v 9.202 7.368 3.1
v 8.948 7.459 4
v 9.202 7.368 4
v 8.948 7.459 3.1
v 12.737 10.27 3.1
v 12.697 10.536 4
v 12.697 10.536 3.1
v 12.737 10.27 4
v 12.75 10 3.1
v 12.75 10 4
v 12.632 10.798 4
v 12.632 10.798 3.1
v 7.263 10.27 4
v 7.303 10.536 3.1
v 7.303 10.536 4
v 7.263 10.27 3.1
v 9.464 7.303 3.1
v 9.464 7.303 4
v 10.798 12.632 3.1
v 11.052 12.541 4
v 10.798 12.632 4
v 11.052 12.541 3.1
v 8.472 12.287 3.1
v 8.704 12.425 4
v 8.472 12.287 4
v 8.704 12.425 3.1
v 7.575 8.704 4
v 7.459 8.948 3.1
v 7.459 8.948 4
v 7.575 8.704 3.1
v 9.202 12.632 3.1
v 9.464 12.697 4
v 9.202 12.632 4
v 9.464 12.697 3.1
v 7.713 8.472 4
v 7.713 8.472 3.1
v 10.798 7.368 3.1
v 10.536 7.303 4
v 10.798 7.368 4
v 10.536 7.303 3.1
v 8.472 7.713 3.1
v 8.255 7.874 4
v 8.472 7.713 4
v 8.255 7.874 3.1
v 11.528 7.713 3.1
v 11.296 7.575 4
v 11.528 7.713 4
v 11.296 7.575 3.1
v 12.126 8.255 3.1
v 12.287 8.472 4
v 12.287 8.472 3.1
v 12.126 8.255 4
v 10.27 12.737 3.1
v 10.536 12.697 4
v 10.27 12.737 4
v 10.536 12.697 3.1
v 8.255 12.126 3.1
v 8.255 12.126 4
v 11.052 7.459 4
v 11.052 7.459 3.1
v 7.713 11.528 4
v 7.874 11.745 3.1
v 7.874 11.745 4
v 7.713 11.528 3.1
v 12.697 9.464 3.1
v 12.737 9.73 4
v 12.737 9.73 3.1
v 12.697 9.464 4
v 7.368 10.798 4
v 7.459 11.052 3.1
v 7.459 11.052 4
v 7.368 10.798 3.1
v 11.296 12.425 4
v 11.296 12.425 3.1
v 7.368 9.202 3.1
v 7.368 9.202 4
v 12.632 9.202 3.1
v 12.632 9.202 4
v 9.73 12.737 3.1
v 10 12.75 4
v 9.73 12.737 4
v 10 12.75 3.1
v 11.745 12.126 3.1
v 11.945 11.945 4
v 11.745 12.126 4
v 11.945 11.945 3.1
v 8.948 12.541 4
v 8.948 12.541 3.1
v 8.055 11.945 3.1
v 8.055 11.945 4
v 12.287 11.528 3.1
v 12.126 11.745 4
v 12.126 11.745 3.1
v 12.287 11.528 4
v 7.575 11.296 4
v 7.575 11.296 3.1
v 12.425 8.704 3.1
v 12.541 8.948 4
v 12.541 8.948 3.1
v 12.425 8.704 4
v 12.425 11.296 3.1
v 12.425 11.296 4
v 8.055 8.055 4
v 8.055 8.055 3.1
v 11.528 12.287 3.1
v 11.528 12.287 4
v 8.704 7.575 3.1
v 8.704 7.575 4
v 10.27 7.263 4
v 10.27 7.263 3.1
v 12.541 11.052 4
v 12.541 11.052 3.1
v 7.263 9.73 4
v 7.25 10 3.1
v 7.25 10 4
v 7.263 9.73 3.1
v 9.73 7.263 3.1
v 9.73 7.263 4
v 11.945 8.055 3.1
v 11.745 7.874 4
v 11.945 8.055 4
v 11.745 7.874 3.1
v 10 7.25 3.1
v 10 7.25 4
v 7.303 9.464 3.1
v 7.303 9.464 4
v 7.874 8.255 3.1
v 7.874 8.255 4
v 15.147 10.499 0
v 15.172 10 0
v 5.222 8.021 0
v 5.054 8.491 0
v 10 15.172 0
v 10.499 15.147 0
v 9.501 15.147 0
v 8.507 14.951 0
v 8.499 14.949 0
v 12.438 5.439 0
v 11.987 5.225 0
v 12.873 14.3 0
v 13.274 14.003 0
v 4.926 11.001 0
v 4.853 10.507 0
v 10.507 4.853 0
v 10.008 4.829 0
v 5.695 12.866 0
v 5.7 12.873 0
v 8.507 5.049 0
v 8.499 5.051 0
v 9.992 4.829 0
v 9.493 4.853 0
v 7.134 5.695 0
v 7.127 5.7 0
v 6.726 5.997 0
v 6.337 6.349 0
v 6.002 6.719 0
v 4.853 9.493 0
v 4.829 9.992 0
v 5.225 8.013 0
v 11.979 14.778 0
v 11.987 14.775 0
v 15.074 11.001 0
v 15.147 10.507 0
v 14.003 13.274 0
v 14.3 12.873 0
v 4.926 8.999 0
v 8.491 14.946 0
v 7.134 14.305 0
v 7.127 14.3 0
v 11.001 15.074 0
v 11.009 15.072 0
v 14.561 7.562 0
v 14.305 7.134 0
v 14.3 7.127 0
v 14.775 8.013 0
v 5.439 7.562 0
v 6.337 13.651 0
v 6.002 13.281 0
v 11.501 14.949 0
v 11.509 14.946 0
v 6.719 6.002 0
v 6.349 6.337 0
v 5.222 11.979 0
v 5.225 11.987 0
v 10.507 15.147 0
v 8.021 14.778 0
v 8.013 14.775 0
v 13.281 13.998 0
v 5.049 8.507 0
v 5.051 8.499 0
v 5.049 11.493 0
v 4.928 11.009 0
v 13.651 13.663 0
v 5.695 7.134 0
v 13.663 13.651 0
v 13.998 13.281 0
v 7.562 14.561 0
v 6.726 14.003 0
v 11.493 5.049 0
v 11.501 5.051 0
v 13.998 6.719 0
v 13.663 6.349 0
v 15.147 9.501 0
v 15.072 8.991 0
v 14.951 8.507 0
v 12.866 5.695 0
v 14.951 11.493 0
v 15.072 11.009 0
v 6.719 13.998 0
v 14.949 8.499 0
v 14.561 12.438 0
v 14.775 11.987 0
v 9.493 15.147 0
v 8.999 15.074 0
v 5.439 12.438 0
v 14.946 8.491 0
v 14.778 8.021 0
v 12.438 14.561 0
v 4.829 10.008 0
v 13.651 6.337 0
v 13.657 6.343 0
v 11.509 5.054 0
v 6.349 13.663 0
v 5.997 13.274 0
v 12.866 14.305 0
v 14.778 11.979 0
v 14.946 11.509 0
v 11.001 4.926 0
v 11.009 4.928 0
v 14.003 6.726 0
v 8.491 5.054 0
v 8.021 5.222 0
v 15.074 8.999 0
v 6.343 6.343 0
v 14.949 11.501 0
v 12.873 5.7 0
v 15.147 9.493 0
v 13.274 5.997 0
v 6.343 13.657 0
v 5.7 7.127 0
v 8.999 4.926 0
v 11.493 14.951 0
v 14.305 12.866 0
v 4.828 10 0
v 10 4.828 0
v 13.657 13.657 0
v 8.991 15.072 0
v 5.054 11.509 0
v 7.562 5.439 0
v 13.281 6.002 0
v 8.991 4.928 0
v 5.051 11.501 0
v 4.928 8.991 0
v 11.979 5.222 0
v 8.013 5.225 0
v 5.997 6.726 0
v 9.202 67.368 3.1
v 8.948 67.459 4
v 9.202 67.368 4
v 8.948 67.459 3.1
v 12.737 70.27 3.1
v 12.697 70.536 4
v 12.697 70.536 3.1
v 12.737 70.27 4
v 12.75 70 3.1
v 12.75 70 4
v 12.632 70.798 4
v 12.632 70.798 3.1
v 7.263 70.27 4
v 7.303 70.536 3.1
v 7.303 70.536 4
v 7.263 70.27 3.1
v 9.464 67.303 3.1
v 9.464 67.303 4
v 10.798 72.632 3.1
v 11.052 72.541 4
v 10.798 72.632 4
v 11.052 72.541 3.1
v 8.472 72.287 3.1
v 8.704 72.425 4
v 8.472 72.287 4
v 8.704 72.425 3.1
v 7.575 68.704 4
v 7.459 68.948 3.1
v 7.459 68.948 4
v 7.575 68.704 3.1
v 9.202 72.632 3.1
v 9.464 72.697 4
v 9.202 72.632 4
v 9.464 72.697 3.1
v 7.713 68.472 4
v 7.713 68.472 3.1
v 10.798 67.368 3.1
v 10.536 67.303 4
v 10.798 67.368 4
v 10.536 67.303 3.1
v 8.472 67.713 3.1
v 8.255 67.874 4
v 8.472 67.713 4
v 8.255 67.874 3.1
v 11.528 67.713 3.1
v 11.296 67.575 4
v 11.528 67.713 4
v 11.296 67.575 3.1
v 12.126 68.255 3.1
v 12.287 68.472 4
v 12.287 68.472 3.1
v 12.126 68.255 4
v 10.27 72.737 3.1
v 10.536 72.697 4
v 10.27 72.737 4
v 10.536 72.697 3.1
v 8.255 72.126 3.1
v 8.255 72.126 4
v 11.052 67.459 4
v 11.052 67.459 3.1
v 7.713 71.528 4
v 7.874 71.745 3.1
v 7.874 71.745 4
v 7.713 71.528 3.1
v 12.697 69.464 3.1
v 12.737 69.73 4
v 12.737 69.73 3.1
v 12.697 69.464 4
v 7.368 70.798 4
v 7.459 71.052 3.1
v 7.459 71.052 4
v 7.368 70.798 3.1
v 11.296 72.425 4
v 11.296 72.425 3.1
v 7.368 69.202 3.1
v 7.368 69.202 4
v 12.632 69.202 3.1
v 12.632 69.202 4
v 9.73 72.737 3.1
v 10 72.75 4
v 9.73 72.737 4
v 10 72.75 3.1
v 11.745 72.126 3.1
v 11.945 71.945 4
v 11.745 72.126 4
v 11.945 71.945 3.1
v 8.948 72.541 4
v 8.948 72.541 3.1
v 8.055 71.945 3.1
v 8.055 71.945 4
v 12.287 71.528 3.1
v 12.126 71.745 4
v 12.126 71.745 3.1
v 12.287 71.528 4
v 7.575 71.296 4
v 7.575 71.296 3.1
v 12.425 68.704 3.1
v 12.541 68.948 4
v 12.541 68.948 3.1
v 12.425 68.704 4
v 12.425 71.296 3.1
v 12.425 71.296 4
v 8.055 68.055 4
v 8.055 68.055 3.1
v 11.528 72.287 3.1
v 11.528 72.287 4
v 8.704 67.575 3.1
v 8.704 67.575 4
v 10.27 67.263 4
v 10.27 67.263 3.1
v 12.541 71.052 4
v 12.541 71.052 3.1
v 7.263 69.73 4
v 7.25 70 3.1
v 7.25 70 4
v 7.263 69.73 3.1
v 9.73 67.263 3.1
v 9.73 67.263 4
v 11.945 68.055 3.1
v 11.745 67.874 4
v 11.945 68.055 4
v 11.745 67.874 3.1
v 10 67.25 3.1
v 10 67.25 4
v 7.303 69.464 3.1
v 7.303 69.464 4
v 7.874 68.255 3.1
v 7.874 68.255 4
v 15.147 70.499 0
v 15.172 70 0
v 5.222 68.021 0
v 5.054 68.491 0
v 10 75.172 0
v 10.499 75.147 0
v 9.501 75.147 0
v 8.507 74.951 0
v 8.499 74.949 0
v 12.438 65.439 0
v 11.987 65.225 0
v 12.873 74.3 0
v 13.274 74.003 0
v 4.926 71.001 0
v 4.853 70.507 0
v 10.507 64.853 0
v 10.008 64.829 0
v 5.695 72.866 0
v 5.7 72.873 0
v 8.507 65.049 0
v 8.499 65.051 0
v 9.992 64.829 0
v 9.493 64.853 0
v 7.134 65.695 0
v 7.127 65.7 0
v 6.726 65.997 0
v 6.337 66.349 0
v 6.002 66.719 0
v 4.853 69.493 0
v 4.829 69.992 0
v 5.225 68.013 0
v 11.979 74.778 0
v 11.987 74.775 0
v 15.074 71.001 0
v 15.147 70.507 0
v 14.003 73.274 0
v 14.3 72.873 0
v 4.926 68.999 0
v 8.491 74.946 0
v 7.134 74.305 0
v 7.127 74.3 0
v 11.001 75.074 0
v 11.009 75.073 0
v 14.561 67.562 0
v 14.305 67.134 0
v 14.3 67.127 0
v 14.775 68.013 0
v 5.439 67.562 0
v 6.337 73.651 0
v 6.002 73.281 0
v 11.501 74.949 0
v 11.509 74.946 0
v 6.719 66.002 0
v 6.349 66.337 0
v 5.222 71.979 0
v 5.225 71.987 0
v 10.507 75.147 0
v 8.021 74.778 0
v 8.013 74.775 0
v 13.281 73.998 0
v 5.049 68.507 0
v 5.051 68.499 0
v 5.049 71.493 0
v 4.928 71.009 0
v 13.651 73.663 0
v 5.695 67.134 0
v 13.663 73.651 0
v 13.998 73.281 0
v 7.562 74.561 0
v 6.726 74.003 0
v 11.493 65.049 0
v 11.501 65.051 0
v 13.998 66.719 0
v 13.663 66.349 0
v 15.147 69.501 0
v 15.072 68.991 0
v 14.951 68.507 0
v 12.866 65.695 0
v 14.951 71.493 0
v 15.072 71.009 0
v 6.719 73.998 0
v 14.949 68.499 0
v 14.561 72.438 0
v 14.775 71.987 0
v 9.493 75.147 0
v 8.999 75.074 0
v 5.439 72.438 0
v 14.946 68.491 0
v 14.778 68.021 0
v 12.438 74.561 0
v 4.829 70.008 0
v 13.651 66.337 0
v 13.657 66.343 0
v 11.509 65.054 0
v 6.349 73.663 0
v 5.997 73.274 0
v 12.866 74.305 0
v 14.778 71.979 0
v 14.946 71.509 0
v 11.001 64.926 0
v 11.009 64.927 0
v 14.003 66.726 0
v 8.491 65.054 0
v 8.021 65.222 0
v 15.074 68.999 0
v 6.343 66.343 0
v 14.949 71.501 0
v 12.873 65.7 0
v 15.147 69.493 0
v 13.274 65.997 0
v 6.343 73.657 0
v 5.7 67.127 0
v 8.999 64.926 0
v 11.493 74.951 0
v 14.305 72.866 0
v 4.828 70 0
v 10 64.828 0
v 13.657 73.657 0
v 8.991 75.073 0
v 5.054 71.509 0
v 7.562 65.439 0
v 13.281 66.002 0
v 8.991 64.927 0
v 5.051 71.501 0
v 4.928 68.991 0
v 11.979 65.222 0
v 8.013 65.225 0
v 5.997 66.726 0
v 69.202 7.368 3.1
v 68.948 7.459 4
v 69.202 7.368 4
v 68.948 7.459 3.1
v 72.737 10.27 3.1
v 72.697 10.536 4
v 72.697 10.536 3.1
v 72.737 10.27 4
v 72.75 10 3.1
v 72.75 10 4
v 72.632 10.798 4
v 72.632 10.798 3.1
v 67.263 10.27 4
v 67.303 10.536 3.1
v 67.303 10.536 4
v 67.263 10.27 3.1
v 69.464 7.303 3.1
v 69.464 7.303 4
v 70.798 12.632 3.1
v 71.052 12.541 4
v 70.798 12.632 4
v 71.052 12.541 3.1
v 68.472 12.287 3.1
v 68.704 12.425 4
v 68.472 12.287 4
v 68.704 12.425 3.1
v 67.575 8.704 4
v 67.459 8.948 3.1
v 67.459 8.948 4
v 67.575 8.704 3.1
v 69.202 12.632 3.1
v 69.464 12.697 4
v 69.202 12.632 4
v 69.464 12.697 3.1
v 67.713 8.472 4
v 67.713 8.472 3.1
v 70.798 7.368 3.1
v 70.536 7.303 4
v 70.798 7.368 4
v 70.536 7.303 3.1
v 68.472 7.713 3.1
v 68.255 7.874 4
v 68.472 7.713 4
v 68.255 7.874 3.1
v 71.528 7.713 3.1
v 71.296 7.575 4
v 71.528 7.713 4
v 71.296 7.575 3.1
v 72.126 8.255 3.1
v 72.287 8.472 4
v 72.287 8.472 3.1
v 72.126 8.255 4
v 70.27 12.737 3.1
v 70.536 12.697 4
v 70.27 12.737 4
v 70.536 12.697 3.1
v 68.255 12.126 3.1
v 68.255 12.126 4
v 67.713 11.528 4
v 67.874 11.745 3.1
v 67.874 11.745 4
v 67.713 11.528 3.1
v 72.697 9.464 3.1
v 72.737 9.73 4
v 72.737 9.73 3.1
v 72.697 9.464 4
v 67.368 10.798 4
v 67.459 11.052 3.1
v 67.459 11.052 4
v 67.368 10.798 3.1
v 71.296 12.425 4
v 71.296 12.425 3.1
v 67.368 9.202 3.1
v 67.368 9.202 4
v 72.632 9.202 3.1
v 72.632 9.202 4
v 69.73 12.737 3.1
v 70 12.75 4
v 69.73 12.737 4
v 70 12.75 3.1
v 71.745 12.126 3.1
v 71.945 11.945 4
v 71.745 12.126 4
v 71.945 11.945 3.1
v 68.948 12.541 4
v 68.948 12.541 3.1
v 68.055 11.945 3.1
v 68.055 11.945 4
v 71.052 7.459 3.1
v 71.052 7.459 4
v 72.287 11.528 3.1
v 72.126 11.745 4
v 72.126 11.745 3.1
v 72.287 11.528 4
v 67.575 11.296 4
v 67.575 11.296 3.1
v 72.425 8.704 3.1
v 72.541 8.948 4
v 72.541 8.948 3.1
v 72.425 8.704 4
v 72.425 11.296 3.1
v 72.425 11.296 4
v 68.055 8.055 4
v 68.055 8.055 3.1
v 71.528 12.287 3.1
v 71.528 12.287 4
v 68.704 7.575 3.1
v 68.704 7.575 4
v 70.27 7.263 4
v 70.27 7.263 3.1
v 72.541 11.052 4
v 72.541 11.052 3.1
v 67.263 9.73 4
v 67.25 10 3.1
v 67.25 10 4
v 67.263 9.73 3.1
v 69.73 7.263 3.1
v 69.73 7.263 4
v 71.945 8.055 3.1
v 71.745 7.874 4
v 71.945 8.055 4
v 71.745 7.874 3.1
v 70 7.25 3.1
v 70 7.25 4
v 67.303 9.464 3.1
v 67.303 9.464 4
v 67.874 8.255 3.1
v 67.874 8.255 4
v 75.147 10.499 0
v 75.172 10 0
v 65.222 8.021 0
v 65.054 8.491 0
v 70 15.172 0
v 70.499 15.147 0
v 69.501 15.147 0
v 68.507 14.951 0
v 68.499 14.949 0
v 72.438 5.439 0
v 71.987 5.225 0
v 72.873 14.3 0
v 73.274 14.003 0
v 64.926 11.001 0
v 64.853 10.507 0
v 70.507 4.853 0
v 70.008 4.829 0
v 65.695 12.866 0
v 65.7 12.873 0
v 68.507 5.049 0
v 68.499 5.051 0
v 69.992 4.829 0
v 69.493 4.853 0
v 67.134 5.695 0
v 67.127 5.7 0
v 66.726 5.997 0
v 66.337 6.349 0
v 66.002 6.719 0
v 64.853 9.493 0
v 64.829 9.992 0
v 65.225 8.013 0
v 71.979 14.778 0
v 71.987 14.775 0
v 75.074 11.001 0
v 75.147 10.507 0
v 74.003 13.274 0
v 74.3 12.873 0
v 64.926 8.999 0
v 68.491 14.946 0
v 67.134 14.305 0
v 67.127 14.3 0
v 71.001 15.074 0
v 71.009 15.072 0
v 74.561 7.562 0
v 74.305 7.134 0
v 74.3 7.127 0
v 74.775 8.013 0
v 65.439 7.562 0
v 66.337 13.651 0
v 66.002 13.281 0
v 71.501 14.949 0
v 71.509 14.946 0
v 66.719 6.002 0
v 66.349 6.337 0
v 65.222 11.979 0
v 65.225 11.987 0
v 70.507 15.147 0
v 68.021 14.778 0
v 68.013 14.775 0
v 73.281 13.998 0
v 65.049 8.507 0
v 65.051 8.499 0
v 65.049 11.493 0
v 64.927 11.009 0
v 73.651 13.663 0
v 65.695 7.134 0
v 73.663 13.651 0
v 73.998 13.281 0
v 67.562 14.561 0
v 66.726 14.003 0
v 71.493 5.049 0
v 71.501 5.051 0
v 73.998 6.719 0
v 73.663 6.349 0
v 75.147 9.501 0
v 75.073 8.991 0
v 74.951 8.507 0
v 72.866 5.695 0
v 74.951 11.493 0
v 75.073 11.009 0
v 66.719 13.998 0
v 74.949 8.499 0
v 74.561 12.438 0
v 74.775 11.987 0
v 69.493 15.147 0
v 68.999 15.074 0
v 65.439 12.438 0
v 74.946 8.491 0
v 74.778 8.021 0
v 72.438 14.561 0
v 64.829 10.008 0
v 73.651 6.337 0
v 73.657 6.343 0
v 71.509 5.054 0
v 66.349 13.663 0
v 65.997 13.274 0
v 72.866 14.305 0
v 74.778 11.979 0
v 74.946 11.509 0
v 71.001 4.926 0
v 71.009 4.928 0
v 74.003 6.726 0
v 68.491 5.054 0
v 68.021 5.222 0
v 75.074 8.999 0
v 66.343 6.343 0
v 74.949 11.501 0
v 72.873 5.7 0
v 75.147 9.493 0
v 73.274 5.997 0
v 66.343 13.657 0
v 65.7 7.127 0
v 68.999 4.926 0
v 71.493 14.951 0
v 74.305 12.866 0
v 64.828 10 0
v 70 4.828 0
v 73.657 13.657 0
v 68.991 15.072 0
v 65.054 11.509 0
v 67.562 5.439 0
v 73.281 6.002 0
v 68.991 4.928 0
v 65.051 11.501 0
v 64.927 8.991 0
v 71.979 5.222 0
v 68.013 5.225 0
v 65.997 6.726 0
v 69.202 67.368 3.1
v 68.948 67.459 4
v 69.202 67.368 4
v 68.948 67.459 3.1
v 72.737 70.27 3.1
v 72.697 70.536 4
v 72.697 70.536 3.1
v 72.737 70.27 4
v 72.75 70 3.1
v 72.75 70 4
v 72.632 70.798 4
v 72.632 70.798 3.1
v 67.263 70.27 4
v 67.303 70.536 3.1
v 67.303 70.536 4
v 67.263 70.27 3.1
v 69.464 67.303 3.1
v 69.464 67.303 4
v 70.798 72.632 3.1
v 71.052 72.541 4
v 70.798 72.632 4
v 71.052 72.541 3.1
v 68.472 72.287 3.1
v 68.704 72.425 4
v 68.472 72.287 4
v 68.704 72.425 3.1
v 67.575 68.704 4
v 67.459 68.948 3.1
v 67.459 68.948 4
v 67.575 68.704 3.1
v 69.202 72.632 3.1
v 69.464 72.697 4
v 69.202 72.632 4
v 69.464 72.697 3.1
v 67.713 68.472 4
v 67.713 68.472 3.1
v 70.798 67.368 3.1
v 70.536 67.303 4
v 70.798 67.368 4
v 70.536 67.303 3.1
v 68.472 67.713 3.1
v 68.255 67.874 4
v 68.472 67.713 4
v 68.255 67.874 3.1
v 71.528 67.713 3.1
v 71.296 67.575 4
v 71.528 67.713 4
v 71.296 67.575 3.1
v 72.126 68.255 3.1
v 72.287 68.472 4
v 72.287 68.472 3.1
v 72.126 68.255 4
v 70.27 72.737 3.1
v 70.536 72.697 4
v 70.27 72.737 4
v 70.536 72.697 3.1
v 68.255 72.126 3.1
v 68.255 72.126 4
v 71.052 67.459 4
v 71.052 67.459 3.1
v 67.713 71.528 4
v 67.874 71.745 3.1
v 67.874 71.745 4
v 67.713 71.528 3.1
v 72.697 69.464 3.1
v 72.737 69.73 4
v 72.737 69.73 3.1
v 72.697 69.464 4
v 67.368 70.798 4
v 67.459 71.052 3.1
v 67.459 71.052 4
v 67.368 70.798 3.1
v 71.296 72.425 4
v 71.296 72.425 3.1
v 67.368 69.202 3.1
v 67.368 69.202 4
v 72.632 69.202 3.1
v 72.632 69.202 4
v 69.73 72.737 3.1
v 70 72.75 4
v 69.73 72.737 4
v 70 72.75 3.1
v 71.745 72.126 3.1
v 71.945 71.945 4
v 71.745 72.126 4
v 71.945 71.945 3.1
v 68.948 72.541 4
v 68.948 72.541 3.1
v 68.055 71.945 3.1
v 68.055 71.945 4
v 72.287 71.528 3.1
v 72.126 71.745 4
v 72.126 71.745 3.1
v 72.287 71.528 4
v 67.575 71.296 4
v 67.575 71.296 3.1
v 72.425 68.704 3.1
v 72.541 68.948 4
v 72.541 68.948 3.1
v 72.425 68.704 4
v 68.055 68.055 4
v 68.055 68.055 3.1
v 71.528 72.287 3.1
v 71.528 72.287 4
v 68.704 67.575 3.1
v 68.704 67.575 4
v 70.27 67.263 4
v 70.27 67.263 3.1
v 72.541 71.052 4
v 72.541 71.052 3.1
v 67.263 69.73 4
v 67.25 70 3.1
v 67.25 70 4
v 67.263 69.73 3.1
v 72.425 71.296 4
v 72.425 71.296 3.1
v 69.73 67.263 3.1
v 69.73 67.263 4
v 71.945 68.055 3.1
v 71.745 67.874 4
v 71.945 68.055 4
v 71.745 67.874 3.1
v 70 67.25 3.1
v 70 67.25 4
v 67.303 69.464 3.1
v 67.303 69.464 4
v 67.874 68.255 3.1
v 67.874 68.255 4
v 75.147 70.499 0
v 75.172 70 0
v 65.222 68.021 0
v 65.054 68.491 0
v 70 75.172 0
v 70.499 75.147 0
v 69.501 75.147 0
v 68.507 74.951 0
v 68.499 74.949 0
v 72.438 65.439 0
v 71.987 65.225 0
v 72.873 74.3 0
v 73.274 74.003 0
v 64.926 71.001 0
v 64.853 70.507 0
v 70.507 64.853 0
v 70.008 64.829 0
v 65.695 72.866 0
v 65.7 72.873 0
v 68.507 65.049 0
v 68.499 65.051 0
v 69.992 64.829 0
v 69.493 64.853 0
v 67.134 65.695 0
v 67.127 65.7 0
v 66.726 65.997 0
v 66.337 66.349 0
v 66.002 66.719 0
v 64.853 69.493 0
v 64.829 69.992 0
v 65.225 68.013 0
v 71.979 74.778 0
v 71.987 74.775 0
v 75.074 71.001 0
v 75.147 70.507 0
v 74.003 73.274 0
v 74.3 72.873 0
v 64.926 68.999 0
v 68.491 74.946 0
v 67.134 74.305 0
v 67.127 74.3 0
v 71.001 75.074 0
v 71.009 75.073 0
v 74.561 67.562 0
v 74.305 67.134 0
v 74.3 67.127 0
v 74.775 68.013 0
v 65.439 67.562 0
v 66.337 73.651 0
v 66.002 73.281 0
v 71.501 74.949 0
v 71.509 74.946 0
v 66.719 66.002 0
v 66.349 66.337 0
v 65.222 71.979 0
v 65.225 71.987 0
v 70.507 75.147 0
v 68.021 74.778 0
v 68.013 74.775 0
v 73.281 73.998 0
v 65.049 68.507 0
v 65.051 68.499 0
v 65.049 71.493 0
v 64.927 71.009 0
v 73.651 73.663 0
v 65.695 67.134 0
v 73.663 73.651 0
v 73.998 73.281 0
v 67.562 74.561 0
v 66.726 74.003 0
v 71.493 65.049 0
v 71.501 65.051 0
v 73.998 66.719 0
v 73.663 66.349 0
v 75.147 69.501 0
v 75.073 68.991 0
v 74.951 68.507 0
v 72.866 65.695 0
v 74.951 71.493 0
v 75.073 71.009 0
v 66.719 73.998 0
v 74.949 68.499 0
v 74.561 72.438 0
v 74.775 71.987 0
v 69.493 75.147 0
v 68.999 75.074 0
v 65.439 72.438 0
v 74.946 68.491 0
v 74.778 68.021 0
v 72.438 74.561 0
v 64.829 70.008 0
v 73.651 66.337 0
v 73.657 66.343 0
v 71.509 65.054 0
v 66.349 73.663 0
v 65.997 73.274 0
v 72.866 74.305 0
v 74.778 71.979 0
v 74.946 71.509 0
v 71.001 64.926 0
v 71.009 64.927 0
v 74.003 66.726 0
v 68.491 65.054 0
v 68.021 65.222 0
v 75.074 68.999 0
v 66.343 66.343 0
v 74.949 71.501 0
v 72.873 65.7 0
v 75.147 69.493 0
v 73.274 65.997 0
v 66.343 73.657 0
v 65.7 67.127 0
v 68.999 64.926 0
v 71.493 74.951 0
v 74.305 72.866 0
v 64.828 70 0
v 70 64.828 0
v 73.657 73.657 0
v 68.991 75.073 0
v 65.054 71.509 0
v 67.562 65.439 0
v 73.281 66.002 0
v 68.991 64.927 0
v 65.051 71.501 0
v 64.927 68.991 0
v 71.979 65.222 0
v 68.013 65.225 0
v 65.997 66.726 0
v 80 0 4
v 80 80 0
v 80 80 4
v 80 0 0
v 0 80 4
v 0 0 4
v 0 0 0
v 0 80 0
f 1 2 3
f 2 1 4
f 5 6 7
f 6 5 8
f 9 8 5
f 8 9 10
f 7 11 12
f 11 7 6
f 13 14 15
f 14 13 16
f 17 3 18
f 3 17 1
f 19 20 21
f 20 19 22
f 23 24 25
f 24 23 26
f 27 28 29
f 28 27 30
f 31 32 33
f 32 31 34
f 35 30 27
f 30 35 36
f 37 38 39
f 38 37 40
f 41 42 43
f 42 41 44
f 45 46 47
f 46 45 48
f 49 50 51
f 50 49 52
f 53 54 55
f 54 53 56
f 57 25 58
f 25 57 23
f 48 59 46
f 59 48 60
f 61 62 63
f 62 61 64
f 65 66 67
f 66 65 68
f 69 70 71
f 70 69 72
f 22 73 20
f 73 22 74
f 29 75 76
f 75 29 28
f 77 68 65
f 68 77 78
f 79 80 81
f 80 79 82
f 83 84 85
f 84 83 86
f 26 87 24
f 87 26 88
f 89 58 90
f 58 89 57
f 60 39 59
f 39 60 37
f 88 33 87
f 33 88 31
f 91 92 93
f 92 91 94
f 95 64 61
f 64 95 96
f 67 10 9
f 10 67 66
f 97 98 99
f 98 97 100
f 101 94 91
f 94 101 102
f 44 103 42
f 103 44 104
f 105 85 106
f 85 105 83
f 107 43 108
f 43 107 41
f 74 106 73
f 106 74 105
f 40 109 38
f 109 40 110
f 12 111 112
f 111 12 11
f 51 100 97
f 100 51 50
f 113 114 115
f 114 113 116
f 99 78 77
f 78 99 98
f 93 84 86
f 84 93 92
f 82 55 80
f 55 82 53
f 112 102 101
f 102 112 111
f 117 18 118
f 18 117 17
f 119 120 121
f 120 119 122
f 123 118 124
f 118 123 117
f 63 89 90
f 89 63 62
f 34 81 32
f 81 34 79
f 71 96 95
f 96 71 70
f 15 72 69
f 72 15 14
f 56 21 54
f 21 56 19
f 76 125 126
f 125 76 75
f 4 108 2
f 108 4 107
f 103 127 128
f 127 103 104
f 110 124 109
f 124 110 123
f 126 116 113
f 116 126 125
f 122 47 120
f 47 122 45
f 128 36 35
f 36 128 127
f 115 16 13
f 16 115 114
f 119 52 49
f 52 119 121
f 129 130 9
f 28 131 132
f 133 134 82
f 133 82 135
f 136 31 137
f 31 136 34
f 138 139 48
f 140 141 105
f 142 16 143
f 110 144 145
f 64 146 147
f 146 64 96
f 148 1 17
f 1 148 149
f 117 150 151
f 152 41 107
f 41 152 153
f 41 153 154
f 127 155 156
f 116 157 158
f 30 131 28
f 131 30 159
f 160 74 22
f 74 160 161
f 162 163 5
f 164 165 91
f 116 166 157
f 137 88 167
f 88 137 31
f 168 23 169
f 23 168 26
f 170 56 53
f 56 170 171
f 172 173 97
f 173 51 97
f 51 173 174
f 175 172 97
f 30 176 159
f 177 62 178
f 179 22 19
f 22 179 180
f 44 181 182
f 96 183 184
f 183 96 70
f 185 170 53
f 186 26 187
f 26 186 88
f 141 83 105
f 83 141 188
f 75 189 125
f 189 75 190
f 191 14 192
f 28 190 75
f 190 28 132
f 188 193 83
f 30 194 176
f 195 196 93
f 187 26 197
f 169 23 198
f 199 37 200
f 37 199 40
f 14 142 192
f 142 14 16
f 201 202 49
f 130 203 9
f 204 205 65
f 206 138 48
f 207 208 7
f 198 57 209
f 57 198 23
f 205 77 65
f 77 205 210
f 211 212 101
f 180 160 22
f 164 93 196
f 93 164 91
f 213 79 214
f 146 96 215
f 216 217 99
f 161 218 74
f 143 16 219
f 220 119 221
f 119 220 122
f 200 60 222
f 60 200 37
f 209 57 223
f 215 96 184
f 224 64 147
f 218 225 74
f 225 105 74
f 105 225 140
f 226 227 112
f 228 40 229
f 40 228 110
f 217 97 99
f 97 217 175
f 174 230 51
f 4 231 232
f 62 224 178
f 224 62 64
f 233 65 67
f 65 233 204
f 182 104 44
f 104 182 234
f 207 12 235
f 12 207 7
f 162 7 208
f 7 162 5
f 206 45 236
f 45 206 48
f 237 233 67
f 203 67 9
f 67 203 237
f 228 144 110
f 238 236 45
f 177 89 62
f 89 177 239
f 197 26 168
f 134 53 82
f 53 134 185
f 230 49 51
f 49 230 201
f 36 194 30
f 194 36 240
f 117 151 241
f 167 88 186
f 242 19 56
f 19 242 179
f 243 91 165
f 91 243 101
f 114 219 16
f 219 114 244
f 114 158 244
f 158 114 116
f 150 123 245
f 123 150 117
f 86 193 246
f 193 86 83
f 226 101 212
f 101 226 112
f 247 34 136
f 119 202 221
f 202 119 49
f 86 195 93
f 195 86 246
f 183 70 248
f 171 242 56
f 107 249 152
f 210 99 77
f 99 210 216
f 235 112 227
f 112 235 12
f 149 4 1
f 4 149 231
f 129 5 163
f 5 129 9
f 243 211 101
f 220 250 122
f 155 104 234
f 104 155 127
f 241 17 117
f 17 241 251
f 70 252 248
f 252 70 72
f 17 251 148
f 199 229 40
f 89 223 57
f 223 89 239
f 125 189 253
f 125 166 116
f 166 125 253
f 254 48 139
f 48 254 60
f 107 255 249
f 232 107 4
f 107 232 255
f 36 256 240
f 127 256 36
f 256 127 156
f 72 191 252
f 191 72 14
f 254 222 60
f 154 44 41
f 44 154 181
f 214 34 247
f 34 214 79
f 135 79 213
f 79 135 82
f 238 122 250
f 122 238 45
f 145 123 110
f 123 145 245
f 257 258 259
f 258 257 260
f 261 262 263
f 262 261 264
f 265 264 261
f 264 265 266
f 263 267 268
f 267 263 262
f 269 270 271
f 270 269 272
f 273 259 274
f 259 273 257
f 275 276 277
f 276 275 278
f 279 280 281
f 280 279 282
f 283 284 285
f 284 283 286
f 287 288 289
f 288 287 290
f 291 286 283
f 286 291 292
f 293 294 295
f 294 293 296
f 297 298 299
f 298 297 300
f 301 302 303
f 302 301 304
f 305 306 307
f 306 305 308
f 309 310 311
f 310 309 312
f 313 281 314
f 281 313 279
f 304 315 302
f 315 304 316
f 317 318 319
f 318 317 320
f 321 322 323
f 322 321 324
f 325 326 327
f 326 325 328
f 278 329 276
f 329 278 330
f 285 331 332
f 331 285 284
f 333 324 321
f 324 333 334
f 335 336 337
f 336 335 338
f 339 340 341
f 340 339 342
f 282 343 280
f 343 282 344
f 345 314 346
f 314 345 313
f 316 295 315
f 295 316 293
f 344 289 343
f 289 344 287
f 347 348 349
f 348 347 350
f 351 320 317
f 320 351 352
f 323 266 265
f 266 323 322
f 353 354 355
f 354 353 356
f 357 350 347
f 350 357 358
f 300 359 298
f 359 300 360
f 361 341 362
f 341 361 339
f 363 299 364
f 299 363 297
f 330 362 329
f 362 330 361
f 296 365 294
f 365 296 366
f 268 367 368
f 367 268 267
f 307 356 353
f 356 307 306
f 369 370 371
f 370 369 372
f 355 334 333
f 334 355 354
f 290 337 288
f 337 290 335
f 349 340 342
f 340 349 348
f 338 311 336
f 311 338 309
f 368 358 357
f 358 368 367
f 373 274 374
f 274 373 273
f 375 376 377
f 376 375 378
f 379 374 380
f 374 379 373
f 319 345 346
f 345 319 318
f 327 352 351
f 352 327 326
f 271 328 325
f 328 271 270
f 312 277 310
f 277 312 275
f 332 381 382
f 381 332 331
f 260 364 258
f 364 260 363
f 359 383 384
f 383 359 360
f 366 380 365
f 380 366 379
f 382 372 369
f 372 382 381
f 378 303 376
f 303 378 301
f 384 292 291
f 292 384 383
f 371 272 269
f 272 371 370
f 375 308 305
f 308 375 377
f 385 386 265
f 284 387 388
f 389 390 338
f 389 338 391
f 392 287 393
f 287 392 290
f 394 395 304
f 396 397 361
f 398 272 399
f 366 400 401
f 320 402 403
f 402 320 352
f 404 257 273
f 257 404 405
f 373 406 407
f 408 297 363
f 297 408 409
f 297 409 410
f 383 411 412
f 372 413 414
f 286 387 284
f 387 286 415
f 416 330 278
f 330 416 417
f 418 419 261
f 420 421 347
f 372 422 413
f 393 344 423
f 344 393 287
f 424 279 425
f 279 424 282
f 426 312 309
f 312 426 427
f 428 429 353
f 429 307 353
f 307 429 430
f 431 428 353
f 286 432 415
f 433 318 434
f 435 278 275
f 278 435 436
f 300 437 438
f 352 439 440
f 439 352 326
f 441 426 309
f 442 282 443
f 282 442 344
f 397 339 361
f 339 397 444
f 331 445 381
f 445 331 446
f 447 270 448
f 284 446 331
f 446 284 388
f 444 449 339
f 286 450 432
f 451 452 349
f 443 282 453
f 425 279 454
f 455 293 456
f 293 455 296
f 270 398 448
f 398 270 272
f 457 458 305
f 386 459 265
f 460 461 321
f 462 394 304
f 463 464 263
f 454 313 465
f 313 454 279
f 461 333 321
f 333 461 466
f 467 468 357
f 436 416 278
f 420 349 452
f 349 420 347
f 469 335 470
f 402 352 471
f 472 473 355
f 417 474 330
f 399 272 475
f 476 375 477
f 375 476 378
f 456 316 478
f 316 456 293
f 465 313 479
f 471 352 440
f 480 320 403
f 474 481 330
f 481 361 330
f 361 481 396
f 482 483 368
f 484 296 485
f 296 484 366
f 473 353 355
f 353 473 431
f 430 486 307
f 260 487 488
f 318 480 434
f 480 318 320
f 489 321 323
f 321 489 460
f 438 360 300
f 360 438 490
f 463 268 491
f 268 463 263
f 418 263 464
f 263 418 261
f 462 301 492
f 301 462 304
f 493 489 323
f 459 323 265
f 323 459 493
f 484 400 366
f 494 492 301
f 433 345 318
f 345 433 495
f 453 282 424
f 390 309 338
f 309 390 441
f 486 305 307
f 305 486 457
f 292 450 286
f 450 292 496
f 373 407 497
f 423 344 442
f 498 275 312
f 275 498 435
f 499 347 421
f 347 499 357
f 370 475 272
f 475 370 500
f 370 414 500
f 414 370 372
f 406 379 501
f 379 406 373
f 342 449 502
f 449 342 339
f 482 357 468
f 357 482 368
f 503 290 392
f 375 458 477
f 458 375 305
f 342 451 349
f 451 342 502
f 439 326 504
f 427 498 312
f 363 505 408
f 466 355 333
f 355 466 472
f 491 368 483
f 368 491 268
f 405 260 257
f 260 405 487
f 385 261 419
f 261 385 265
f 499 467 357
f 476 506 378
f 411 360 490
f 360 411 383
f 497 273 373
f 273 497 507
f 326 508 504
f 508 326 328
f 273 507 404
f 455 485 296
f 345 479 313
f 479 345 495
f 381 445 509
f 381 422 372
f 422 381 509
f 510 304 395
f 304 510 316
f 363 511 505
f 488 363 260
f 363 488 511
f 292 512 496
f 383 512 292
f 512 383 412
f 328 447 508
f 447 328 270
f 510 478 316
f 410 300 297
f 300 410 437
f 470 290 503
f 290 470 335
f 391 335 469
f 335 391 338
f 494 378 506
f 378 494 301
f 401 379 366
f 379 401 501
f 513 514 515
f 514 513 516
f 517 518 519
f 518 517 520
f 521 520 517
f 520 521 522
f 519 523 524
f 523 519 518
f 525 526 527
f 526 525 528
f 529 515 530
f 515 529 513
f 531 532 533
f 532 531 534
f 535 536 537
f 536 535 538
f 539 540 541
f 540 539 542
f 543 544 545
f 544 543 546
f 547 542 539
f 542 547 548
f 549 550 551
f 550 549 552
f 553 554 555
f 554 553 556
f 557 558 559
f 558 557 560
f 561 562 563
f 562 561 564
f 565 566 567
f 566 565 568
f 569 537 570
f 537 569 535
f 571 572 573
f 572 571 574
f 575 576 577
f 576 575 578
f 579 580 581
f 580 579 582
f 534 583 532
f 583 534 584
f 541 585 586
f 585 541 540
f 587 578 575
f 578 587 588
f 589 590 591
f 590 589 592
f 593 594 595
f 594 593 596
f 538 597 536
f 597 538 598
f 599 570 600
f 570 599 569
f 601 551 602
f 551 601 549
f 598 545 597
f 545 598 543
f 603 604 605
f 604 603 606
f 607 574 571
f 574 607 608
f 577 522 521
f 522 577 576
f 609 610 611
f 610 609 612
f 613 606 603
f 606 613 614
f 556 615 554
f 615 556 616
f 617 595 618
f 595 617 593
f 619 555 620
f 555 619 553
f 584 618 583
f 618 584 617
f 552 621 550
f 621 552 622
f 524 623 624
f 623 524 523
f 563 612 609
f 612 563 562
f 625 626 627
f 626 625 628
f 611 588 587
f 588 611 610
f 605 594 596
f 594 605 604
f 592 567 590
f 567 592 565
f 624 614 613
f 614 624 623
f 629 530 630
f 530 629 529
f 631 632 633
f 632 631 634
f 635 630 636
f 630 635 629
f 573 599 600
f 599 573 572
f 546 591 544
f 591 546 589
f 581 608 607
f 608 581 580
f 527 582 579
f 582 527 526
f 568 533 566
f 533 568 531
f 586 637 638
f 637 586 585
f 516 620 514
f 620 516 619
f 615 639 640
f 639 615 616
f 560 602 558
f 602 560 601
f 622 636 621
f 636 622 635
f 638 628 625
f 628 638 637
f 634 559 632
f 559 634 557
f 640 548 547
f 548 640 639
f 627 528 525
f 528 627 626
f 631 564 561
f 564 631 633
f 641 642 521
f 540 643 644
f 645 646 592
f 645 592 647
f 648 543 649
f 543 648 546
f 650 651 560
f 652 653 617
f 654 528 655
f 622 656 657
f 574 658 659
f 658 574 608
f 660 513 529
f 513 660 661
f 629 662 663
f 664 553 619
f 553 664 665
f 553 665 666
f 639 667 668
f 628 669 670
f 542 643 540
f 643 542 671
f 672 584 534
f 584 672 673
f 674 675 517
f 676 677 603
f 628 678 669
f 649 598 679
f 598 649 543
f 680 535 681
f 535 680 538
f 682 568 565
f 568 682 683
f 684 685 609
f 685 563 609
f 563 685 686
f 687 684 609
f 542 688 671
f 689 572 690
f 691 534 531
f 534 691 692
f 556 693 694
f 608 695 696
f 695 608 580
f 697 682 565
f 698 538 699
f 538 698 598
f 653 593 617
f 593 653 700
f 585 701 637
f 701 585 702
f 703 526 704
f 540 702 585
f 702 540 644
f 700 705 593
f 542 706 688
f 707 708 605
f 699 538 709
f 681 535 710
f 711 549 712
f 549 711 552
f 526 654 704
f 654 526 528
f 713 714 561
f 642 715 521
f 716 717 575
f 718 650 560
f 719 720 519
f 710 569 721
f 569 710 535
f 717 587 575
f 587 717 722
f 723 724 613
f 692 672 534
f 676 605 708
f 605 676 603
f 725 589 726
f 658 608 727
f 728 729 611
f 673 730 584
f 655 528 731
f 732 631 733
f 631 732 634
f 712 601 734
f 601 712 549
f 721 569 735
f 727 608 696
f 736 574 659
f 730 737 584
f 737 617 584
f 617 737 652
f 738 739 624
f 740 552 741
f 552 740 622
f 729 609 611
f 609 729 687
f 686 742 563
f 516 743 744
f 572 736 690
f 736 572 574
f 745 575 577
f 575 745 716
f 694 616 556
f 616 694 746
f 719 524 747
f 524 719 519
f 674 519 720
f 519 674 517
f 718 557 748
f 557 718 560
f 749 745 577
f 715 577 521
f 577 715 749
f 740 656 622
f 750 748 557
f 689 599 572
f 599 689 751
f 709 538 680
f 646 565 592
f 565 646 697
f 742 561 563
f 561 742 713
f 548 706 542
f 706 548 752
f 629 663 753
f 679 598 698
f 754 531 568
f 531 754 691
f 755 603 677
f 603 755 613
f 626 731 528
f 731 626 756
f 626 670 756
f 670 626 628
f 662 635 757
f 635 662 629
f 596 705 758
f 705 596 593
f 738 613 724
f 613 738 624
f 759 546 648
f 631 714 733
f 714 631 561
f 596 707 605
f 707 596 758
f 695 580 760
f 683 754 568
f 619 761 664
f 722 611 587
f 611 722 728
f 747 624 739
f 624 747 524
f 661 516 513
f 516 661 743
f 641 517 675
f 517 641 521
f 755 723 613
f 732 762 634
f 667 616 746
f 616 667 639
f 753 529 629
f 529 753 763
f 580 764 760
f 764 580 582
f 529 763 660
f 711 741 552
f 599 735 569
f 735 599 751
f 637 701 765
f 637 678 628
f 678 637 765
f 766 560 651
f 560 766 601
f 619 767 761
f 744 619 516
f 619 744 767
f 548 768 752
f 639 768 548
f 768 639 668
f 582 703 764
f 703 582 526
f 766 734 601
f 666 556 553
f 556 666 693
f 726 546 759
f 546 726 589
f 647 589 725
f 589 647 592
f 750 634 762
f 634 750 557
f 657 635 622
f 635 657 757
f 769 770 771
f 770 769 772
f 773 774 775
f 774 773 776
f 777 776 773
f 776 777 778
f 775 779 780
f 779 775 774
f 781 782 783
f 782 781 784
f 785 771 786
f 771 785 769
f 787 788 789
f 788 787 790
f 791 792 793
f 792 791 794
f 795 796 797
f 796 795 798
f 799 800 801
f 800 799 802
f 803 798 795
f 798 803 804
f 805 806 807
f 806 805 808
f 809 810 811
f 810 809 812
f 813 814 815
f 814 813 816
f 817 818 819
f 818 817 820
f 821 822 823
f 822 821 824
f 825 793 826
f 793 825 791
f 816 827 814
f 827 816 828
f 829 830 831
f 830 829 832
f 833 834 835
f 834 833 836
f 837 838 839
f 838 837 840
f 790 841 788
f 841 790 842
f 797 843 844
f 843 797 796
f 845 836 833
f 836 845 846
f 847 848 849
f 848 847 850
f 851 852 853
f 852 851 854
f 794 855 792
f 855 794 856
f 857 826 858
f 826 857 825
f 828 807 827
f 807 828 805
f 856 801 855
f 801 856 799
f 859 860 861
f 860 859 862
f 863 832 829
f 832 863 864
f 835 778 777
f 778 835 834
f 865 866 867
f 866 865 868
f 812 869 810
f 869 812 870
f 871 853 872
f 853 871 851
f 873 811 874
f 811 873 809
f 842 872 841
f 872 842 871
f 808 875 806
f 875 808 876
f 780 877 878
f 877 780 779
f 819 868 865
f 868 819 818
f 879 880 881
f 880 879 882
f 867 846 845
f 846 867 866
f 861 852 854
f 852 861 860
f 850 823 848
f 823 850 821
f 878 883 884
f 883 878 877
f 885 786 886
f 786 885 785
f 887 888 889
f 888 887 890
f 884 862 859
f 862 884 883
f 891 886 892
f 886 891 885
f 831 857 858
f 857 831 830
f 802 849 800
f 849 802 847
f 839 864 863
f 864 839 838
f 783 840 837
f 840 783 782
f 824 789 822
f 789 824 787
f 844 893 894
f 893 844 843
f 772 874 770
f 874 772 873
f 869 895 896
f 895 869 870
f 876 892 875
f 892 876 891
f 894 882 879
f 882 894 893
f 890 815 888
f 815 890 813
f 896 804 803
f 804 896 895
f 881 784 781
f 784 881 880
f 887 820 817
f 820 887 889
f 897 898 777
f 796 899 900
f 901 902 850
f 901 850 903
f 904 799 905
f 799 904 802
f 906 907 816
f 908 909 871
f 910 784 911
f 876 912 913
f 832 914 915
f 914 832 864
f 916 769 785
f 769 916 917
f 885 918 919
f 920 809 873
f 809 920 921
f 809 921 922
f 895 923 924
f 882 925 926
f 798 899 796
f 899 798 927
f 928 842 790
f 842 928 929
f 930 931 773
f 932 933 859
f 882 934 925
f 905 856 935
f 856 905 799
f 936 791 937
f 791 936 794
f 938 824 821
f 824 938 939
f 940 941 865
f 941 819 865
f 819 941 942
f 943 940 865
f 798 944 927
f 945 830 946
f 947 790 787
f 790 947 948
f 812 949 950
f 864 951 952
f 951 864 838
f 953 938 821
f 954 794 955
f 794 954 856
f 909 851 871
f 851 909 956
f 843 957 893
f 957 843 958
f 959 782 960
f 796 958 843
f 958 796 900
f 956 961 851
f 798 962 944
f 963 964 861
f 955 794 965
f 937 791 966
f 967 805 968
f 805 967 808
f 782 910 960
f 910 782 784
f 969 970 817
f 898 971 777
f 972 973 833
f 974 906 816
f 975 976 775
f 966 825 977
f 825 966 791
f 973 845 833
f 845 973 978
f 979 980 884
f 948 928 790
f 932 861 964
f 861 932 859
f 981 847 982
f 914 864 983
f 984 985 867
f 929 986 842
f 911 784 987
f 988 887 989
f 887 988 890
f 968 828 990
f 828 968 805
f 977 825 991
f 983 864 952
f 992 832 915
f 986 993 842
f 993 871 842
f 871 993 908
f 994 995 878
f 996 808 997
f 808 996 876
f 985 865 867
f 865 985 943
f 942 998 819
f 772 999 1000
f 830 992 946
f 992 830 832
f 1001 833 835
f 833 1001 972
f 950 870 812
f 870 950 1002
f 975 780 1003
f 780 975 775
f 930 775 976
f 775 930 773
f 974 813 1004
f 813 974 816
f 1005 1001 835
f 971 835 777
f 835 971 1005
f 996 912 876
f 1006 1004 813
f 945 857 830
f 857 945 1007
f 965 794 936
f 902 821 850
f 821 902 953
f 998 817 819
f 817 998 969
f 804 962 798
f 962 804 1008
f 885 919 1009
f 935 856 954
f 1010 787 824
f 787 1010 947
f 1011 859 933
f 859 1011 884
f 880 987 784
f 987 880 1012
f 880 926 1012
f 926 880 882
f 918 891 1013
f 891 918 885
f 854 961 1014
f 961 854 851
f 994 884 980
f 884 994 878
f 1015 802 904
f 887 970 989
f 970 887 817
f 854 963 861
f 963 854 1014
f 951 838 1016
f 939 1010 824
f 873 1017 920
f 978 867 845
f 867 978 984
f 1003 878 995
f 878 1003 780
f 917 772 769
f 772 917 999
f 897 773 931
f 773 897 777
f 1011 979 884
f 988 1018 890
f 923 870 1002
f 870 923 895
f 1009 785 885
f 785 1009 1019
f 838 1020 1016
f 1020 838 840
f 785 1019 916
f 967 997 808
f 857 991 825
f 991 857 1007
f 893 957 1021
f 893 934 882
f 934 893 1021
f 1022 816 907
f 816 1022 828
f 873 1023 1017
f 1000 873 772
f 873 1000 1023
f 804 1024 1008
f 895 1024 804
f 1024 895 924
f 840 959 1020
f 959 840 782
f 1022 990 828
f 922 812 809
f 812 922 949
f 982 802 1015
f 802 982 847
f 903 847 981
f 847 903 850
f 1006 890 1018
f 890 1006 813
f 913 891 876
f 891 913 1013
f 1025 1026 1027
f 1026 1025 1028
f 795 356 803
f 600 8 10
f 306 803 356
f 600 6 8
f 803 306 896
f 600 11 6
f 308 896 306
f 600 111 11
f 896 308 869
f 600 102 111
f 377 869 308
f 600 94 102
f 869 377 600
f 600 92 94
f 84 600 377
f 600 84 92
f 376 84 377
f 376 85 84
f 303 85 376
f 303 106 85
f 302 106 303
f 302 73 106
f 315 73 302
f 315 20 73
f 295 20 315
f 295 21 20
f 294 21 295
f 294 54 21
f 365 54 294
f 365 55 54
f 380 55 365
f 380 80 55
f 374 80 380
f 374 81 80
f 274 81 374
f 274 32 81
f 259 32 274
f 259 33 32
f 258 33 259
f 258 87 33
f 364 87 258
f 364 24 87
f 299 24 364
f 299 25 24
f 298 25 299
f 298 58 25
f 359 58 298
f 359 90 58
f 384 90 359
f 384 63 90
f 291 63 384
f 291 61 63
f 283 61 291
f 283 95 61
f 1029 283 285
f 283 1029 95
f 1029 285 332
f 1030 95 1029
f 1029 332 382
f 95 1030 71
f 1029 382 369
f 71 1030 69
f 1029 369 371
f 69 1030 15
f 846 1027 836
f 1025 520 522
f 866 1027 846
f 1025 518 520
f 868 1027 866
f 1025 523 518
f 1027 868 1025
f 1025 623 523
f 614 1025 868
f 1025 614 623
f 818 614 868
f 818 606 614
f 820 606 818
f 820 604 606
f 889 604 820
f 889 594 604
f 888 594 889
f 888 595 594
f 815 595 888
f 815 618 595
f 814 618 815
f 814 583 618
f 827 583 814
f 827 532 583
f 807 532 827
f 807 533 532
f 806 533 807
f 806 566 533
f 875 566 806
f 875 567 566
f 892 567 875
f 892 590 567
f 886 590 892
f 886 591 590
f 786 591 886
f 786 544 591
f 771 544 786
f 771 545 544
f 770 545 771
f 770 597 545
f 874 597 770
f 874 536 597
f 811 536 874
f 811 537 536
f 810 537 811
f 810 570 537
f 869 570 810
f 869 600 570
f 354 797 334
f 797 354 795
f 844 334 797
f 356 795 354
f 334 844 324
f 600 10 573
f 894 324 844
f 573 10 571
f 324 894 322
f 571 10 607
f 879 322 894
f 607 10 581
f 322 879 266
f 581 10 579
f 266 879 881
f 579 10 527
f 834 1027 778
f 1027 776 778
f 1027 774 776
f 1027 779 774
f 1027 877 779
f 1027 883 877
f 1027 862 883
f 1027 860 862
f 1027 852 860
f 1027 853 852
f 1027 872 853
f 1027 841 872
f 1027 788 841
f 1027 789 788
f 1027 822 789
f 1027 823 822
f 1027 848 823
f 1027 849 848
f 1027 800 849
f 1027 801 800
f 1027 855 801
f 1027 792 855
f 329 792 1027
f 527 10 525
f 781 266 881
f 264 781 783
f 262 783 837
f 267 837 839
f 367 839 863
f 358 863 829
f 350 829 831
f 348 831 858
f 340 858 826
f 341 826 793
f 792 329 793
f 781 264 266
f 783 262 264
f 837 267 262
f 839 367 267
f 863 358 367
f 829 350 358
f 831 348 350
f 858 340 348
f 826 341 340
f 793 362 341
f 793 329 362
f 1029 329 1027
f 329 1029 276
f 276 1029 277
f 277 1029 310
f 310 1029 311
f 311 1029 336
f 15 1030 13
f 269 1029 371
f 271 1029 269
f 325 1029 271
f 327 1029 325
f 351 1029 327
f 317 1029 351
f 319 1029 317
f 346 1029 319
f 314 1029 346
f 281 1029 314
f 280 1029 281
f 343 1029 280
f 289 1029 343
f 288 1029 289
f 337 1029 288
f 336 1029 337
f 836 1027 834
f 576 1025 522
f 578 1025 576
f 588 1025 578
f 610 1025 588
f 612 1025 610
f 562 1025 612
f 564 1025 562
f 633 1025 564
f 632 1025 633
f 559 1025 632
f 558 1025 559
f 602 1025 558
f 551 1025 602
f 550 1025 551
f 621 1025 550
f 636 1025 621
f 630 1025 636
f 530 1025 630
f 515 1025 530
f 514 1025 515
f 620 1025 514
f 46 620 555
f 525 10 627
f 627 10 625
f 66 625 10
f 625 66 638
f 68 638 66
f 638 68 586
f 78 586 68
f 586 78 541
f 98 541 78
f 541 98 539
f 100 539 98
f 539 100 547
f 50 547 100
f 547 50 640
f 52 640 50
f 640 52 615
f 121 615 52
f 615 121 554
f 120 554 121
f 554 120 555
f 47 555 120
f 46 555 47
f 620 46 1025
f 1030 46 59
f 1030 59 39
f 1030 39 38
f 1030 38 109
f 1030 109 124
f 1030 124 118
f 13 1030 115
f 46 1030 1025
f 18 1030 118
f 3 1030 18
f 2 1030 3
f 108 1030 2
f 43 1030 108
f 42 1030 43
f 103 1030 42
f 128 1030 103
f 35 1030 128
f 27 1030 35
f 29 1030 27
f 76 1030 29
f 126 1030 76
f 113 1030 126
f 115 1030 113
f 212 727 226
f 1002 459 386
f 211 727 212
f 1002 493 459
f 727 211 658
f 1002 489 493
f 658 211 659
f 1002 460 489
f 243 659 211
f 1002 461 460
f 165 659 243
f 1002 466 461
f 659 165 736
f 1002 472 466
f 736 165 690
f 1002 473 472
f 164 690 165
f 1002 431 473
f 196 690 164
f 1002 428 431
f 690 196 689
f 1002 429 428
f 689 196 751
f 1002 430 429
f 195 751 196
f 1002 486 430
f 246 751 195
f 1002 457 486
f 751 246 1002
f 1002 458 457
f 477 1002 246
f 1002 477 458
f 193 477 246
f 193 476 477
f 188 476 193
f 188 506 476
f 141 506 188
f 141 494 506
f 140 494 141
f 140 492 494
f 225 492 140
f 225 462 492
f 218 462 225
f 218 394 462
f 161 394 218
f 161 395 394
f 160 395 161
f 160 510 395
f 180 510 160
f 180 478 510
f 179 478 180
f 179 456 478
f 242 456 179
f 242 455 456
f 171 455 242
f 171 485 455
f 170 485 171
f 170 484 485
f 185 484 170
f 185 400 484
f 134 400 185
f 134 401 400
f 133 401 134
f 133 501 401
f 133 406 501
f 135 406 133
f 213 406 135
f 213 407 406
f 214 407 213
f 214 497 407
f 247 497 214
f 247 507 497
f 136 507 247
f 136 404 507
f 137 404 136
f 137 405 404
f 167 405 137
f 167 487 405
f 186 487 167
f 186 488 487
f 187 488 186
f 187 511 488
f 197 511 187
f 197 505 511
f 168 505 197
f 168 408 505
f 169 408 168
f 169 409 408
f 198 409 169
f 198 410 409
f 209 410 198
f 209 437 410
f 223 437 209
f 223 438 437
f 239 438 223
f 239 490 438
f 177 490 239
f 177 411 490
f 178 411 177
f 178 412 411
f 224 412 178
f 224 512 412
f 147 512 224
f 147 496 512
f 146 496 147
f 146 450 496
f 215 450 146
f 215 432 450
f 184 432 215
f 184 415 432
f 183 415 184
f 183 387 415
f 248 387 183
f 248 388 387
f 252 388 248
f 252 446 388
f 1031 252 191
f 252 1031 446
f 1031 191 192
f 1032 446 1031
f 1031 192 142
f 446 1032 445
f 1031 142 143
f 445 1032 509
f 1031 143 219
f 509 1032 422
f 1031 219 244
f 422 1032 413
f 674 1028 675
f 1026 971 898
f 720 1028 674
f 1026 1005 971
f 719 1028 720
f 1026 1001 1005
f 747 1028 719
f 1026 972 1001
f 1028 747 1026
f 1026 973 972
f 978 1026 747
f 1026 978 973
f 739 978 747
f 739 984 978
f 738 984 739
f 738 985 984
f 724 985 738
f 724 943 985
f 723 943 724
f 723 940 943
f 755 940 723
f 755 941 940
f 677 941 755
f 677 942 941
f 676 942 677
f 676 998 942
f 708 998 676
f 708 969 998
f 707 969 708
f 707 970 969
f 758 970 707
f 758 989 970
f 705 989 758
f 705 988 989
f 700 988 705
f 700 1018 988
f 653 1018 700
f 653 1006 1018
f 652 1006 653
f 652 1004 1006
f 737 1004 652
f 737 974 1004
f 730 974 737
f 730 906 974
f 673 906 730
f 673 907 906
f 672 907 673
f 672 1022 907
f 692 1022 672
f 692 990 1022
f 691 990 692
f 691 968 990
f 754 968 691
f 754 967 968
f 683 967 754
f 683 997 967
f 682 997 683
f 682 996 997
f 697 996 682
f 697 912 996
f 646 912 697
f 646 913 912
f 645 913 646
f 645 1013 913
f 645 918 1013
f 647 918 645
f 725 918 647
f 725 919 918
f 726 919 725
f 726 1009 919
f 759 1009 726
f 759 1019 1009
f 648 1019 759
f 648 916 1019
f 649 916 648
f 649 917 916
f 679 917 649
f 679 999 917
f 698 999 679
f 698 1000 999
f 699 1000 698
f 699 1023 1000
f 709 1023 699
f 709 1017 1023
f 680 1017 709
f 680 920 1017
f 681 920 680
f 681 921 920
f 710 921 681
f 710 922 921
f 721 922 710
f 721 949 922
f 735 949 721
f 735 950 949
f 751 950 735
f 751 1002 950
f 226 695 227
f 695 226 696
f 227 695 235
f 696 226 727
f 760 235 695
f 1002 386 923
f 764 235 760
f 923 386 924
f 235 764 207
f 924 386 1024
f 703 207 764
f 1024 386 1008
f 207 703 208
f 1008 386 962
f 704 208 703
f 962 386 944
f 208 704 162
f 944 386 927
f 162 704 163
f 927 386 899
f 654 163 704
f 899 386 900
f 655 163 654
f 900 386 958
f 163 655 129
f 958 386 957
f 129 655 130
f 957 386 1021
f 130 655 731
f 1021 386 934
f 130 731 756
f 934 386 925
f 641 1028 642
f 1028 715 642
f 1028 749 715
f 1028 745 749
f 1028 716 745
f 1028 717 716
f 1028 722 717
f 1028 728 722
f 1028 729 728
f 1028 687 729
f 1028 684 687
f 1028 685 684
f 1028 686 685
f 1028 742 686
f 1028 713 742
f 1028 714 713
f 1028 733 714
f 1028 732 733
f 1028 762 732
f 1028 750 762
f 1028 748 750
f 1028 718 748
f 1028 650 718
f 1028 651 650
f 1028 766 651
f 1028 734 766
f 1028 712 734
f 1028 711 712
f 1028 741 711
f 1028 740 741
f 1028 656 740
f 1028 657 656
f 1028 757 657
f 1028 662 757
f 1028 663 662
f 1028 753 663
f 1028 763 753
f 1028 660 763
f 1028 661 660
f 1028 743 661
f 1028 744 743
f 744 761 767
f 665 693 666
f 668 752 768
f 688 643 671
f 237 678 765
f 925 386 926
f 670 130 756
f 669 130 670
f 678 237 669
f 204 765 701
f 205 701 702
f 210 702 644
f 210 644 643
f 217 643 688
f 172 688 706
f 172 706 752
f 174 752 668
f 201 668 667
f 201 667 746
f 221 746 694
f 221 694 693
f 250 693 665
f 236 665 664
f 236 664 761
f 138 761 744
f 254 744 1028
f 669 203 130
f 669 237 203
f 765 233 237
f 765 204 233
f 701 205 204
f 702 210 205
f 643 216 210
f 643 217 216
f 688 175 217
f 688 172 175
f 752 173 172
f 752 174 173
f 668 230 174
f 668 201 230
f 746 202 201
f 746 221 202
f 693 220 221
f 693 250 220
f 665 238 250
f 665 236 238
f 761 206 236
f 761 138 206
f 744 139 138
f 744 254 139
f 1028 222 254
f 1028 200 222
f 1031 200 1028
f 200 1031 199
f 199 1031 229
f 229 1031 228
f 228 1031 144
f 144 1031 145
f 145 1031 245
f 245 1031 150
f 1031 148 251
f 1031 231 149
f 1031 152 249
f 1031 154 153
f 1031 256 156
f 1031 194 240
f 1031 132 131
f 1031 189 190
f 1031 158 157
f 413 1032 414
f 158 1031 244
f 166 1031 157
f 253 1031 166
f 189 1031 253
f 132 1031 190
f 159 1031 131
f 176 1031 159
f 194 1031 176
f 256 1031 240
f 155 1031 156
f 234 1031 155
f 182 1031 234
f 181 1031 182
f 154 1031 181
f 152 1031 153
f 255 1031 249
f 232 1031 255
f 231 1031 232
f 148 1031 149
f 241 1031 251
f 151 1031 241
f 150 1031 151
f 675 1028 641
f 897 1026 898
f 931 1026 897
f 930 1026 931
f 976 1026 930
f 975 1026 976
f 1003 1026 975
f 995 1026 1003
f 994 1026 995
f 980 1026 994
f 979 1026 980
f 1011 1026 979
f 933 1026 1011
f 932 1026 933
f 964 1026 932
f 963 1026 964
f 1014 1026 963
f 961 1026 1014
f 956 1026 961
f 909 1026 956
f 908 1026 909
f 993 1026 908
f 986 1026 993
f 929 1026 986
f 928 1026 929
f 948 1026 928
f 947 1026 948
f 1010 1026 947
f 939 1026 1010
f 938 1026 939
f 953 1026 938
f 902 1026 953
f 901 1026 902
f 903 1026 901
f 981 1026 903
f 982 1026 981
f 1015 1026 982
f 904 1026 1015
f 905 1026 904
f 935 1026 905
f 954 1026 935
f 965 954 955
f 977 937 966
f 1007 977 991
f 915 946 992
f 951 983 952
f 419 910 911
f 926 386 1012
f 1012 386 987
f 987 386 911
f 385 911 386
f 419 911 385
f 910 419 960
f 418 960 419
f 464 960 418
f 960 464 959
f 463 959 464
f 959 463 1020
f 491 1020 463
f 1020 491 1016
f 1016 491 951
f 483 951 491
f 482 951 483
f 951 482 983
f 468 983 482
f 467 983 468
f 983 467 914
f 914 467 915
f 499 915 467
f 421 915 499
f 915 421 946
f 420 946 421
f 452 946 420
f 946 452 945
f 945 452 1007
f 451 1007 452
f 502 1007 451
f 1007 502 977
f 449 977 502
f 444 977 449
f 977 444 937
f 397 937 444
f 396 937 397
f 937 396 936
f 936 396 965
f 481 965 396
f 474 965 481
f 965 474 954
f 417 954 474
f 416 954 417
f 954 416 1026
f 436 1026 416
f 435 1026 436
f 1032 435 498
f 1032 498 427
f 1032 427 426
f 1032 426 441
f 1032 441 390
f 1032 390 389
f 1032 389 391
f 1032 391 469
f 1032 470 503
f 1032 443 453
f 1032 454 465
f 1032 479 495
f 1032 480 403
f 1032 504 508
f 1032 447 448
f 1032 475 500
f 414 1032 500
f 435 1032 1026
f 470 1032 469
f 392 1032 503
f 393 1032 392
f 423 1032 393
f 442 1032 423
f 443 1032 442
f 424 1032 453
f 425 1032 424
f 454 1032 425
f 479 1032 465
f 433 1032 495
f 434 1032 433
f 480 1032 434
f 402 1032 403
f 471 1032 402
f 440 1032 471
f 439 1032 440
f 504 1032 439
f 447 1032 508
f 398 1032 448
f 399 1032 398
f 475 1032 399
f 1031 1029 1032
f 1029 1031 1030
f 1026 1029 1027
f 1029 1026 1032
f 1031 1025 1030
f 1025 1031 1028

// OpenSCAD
// ═══════════════════════════════════════════════════════════════════════════
//  Wall Mount Plate  —  standalone part file
//  80 × 80 × 4 mm flat plate that screws to the wall (4× M5 countersunk).
//  Attach the IP65 camera box directly to the front face with
//  VHB double-sided tape or M3 screws through the box back.
//
//  Open in OpenSCAD → F6 → File → Export → STL
//  Print in PETG (preferred) or PLA+ at 0.2 mm layers, 4 perimeters,
//  25 % gyroid infill. No supports needed.
// ═══════════════════════════════════════════════════════════════════════════

PLATE_W  = 80;   // square side length (mm)
PLATE_TH =  4;   // plate thickness   (mm)

$fn = 64;

module wall_mount() {
    difference() {
        cube([PLATE_W, PLATE_W, PLATE_TH]);

        // 4× wall-screw holes (M5 clearance ⌀5.5) with countersinks on
        // the back face so the screw heads sit flush against the wall.
        for (x = [10, PLATE_W - 10], y = [10, PLATE_W - 10]) {
            translate([x, y, -1])
                cylinder(d=5.5, h=PLATE_TH + 2);
            translate([x, y, -0.1])
                cylinder(d1=10.5, d2=5.5, h=3.2);   // 90° countersink
        }
    }
}

wall_mount();
